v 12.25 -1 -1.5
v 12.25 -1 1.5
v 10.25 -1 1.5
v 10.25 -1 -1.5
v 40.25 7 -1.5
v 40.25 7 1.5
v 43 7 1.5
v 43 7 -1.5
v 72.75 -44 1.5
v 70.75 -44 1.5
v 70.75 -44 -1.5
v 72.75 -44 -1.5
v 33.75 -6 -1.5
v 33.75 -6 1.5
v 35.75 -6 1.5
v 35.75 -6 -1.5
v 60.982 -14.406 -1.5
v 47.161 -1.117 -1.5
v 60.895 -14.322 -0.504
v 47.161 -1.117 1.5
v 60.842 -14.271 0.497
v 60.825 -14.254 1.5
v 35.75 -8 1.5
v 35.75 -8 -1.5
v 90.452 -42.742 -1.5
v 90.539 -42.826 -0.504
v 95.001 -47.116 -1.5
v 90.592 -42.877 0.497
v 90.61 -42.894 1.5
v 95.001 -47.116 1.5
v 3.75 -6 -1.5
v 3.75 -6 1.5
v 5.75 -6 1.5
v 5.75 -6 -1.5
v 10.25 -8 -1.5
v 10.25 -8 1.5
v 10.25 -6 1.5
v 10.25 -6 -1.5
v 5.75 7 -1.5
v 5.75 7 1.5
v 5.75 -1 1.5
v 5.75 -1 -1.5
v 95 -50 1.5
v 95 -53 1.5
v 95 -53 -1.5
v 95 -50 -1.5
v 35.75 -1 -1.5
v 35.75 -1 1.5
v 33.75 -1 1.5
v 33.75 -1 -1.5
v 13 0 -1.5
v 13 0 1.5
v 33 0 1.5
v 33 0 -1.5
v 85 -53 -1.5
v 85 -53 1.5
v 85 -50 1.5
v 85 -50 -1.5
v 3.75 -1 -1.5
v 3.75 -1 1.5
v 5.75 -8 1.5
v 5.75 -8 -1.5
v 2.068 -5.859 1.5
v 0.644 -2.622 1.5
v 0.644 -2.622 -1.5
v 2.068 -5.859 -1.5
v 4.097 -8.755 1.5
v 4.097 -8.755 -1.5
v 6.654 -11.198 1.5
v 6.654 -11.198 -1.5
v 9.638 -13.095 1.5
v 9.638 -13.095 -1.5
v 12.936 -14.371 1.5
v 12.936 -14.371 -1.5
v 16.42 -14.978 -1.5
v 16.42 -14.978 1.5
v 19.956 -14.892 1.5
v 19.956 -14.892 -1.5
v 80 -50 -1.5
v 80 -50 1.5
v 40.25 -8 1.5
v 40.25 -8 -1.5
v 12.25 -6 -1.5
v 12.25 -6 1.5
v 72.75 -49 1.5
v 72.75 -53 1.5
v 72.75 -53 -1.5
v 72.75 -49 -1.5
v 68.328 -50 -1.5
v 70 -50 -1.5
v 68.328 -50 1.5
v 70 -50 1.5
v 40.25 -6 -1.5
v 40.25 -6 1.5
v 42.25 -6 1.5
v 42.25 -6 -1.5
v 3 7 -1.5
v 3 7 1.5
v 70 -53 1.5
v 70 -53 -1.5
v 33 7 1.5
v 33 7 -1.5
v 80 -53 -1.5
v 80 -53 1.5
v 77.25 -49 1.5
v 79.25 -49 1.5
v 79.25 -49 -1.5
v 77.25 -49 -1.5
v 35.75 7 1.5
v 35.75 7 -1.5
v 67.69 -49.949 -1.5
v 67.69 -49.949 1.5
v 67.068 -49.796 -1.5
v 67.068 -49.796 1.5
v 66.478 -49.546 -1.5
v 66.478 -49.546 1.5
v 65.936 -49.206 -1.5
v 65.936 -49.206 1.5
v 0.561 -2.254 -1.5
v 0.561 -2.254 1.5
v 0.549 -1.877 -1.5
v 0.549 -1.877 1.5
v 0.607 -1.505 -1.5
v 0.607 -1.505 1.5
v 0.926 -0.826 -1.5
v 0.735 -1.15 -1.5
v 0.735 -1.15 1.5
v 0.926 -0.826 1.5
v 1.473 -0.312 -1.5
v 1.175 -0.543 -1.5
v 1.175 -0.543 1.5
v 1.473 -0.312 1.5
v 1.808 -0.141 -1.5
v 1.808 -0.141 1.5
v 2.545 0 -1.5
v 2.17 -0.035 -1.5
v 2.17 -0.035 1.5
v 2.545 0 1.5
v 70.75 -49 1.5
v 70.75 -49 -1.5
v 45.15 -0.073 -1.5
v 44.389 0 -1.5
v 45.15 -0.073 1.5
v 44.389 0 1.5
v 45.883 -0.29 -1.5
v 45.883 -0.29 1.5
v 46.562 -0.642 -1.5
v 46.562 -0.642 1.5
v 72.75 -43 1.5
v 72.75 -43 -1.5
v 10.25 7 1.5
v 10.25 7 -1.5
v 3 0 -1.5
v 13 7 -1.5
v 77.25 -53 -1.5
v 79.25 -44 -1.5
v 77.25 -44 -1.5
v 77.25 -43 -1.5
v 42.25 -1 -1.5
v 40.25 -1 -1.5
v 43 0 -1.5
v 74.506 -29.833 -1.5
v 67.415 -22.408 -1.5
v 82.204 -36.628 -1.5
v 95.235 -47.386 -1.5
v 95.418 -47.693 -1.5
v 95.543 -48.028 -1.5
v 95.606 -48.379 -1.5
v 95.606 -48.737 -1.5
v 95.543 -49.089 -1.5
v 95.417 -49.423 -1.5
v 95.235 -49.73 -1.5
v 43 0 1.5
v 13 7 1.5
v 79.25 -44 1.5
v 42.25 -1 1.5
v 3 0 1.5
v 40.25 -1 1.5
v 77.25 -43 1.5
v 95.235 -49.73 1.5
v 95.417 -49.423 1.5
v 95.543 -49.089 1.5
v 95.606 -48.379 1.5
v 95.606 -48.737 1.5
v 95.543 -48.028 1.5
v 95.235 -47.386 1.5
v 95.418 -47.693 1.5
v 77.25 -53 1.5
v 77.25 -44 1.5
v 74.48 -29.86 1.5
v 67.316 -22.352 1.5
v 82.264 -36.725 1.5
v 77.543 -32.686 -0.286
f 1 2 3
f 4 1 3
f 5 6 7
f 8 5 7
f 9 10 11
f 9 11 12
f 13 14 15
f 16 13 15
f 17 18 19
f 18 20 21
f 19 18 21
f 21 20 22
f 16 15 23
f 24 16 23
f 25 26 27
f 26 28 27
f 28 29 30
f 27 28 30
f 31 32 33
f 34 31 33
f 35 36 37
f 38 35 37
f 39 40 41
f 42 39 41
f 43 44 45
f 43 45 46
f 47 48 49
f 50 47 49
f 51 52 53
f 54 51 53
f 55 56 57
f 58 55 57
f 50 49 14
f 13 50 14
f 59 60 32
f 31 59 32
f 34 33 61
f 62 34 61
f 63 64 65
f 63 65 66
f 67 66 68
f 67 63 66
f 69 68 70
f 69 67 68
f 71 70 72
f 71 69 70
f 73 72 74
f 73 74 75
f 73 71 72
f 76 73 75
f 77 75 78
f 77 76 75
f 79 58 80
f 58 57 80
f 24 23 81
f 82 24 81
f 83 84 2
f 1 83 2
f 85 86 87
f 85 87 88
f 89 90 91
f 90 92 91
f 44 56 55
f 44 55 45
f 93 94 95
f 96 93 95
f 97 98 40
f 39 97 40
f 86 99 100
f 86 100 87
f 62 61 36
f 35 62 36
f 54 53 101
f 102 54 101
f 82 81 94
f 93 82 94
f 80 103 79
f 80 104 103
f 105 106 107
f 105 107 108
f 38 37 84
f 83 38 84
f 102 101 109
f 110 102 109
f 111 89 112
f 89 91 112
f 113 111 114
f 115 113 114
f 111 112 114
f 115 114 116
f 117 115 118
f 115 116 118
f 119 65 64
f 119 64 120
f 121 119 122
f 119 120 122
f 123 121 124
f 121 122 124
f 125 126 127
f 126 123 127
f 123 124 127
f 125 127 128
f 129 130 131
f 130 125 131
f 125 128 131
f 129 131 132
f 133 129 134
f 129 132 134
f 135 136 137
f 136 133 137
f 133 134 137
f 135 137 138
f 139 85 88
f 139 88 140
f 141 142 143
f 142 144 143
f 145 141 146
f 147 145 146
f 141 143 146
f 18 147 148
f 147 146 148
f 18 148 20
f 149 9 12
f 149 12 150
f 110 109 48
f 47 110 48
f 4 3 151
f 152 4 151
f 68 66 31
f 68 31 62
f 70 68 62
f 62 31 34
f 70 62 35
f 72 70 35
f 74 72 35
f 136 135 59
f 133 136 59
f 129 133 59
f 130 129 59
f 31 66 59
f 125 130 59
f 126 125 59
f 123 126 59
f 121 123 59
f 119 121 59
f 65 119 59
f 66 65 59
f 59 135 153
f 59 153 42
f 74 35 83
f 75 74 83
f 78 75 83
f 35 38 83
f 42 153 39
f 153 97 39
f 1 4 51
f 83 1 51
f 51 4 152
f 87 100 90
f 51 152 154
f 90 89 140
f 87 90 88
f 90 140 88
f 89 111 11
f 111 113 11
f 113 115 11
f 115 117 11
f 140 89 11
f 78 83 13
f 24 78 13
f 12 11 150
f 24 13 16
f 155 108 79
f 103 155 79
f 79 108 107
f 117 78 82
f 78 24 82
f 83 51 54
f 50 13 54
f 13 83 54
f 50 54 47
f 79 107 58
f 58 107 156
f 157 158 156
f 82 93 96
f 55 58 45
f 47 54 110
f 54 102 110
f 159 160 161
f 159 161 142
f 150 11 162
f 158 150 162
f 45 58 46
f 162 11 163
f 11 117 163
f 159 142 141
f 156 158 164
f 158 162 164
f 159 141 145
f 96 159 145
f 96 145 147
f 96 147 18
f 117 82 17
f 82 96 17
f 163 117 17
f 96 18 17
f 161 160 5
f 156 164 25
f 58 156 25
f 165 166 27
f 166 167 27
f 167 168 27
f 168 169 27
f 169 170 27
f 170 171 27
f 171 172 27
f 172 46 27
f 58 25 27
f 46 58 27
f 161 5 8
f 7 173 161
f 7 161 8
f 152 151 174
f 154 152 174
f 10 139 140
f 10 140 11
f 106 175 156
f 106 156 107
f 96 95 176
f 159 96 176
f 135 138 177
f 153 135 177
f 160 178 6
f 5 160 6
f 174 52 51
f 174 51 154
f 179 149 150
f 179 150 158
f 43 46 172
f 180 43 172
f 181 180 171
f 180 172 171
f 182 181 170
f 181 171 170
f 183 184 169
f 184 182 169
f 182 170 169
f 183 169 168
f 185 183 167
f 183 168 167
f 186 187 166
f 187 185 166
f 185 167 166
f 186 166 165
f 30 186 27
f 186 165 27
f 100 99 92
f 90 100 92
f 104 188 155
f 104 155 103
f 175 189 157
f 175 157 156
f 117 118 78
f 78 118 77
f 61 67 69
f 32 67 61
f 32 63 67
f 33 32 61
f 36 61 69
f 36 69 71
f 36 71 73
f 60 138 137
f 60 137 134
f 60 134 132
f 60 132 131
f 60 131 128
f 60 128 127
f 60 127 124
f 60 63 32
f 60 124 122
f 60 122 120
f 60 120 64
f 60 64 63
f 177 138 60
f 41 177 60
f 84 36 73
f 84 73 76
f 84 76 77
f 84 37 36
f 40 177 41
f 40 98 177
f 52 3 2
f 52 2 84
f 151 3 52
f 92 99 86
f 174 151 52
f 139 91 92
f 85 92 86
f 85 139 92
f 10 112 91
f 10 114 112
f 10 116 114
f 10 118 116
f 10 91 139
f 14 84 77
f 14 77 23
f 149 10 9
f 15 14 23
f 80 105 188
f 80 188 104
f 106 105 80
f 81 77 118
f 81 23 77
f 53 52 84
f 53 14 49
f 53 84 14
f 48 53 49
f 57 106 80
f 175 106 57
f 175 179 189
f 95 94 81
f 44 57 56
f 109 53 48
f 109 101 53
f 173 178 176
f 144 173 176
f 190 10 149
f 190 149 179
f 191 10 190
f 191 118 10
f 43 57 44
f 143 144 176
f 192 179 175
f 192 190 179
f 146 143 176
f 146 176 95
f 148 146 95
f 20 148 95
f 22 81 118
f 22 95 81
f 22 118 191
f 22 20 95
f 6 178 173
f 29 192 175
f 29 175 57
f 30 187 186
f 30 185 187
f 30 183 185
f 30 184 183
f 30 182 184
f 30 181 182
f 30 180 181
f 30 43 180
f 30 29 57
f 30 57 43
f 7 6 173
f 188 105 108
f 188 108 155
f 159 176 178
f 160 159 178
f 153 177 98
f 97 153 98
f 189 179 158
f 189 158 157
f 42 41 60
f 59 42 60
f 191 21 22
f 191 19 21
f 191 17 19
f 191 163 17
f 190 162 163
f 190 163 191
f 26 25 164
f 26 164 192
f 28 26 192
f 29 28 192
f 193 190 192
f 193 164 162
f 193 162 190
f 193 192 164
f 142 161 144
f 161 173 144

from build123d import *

# Parameters (mm, degrees)
SKETCH_1_W          = 10
SKETCH_1_H          = 3
SKETCH_1_H_2        = 7
EXTRUDE_1_DEPTH     = 1.5
FILLET_1_R          = 4
EXTRUDE_2_DEPTH     = 3
CUT_EXTRUDE_1_DEPTH = 112.454026397
FILLET_2_R          = 2


with BuildPart() as part:
    # 草图1 → 凸台-拉伸1 (new, symmetric)
    with BuildSketch(Plane.XY):
        with Locations((90, -51.5)):
            Rectangle(SKETCH_1_W, SKETCH_1_H)
        Polygon((67, -50), (0, 0), (46, 0), (98, -50), align=None)
        with Locations((38, 3.5)):
            Rectangle(SKETCH_1_W, SKETCH_1_H_2)
        with Locations((8, 3.5)):
            Rectangle(SKETCH_1_W, SKETCH_1_H_2)
        with Locations((75, -51.5)):
            Rectangle(SKETCH_1_W, SKETCH_1_H)
    extrude(amount=EXTRUDE_1_DEPTH, both=True)

    # 圆角1
    fillet_1_edges = [part.edges().sort_by_distance(p)[0] for p in [
        (67, -50, 0),
        (46, 0, 0),
    ]]
    fillet(fillet_1_edges, radius=FILLET_1_R)

    # 草图5 → 凸台-拉伸2 (add)
    with BuildSketch(Plane.XY.offset(1.5)):
        with BuildLine():
            ThreePointArc((0, 0), (6.98733973, -11.453256458), (19.95552359, -14.892181783))
            Line((19.95552359, -14.892181783), (0, 0))
        make_face()
    extrude(amount=-EXTRUDE_2_DEPTH)

    # 草图2 → 切除-拉伸1 (cut, through all)
    with BuildSketch(Plane.XY.offset(1.5)):
        Polygon((72.75, -53), (72.75, -49), (70.75, -49), (70.75, -44), (72.75, -44), (72.75, -43), (77.25, -43), (77.25, -44), (79.25, -44), (79.25, -49), (77.25, -49), (77.25, -53), align=None)
        Polygon((35.75, 7), (35.75, -1), (33.75, -1), (33.75, -6), (35.75, -6), (35.75, -8), (40.25, -8), (40.25, -6), (42.25, -6), (42.25, -1), (40.25, -1), (40.25, 7), align=None)
        Polygon((10.25, 7), (5.75, 7), (5.75, -1), (3.75, -1), (3.75, -6), (5.75, -6), (5.75, -8), (10.25, -8), (10.25, -6), (12.25, -6), (12.25, -1), (10.25, -1), align=None)
    extrude(amount=-CUT_EXTRUDE_1_DEPTH, mode=Mode.SUBTRACT)

    # 草图3 → 切除-旋转3 (revolve, cut)
    with BuildSketch(Plane.XY.offset(1.5)):
        with BuildLine():
            Line((158, -63.5), (158, 177.5))
            ThreePointArc((158, 177.5), (37.5, 57), (158, -63.5))
        make_face()
    revolve(axis=Axis((158, -1021.279080972, 1.5), (0, 1, 0)), mode=Mode.SUBTRACT)

    # 圆角2
    # the kernel refuses this fillet: 2 mm, written as the material it takes off along each edge
    with BuildSketch(Plane(origin=(98, -50, -11.90231354), x_dir=(-1, 0, 0), z_dir=(0, 0, 1))) as fillet_2_piece_1:
        with BuildLine():
            CenterArc((4.385550053, -1.442307544), FILLET_2_R, 133.850179686, 92.273123028)
            Line((2.99933262, -2.883973674), (2.971608272, -2.912806996))
            Line((2.971608272, -2.912806996), (-0.027724349, -0.028833323))
            Line((-0.027724349, -0.028833323), (0, 0.04))
            ThreePointArc((0, 0.04), (1.5, 0.04), (2.972288999, 0.028846151))
            Line((2.972288999, 0.028846151), (3, 0))
        make_face()
    extrude(amount=23.80462708, mode=Mode.SUBTRACT)
    with BuildSketch(Plane(origin=(0, 0, 8.248897597), x_dir=(0.23863429141871206, -0.971109507192206, 0), z_dir=(0, 0, -1))) as fillet_2_piece_2:
        with BuildLine():
            CenterArc((2.549583536, -1.99436891), FILLET_2_R, 85.699481489, 108.106467665)
            Line((0.607364522, -2.471637493), (0.568520142, -2.481182864))
            Line((0.568520142, -2.481182864), (-0.03884438, -0.009545372))
            Line((-0.03884438, -0.009545372), (-0.00299951, 0.039887378))
            ThreePointArc((-0.00299951, 0.039887378), (1.349779519, 0.090679811), (2.702558549, 0.039887378))
            Line((2.702558549, 0.039887378), (2.699559039, 0))
        make_face()
    extrude(amount=16.497795193, mode=Mode.SUBTRACT)


solid = part.part
